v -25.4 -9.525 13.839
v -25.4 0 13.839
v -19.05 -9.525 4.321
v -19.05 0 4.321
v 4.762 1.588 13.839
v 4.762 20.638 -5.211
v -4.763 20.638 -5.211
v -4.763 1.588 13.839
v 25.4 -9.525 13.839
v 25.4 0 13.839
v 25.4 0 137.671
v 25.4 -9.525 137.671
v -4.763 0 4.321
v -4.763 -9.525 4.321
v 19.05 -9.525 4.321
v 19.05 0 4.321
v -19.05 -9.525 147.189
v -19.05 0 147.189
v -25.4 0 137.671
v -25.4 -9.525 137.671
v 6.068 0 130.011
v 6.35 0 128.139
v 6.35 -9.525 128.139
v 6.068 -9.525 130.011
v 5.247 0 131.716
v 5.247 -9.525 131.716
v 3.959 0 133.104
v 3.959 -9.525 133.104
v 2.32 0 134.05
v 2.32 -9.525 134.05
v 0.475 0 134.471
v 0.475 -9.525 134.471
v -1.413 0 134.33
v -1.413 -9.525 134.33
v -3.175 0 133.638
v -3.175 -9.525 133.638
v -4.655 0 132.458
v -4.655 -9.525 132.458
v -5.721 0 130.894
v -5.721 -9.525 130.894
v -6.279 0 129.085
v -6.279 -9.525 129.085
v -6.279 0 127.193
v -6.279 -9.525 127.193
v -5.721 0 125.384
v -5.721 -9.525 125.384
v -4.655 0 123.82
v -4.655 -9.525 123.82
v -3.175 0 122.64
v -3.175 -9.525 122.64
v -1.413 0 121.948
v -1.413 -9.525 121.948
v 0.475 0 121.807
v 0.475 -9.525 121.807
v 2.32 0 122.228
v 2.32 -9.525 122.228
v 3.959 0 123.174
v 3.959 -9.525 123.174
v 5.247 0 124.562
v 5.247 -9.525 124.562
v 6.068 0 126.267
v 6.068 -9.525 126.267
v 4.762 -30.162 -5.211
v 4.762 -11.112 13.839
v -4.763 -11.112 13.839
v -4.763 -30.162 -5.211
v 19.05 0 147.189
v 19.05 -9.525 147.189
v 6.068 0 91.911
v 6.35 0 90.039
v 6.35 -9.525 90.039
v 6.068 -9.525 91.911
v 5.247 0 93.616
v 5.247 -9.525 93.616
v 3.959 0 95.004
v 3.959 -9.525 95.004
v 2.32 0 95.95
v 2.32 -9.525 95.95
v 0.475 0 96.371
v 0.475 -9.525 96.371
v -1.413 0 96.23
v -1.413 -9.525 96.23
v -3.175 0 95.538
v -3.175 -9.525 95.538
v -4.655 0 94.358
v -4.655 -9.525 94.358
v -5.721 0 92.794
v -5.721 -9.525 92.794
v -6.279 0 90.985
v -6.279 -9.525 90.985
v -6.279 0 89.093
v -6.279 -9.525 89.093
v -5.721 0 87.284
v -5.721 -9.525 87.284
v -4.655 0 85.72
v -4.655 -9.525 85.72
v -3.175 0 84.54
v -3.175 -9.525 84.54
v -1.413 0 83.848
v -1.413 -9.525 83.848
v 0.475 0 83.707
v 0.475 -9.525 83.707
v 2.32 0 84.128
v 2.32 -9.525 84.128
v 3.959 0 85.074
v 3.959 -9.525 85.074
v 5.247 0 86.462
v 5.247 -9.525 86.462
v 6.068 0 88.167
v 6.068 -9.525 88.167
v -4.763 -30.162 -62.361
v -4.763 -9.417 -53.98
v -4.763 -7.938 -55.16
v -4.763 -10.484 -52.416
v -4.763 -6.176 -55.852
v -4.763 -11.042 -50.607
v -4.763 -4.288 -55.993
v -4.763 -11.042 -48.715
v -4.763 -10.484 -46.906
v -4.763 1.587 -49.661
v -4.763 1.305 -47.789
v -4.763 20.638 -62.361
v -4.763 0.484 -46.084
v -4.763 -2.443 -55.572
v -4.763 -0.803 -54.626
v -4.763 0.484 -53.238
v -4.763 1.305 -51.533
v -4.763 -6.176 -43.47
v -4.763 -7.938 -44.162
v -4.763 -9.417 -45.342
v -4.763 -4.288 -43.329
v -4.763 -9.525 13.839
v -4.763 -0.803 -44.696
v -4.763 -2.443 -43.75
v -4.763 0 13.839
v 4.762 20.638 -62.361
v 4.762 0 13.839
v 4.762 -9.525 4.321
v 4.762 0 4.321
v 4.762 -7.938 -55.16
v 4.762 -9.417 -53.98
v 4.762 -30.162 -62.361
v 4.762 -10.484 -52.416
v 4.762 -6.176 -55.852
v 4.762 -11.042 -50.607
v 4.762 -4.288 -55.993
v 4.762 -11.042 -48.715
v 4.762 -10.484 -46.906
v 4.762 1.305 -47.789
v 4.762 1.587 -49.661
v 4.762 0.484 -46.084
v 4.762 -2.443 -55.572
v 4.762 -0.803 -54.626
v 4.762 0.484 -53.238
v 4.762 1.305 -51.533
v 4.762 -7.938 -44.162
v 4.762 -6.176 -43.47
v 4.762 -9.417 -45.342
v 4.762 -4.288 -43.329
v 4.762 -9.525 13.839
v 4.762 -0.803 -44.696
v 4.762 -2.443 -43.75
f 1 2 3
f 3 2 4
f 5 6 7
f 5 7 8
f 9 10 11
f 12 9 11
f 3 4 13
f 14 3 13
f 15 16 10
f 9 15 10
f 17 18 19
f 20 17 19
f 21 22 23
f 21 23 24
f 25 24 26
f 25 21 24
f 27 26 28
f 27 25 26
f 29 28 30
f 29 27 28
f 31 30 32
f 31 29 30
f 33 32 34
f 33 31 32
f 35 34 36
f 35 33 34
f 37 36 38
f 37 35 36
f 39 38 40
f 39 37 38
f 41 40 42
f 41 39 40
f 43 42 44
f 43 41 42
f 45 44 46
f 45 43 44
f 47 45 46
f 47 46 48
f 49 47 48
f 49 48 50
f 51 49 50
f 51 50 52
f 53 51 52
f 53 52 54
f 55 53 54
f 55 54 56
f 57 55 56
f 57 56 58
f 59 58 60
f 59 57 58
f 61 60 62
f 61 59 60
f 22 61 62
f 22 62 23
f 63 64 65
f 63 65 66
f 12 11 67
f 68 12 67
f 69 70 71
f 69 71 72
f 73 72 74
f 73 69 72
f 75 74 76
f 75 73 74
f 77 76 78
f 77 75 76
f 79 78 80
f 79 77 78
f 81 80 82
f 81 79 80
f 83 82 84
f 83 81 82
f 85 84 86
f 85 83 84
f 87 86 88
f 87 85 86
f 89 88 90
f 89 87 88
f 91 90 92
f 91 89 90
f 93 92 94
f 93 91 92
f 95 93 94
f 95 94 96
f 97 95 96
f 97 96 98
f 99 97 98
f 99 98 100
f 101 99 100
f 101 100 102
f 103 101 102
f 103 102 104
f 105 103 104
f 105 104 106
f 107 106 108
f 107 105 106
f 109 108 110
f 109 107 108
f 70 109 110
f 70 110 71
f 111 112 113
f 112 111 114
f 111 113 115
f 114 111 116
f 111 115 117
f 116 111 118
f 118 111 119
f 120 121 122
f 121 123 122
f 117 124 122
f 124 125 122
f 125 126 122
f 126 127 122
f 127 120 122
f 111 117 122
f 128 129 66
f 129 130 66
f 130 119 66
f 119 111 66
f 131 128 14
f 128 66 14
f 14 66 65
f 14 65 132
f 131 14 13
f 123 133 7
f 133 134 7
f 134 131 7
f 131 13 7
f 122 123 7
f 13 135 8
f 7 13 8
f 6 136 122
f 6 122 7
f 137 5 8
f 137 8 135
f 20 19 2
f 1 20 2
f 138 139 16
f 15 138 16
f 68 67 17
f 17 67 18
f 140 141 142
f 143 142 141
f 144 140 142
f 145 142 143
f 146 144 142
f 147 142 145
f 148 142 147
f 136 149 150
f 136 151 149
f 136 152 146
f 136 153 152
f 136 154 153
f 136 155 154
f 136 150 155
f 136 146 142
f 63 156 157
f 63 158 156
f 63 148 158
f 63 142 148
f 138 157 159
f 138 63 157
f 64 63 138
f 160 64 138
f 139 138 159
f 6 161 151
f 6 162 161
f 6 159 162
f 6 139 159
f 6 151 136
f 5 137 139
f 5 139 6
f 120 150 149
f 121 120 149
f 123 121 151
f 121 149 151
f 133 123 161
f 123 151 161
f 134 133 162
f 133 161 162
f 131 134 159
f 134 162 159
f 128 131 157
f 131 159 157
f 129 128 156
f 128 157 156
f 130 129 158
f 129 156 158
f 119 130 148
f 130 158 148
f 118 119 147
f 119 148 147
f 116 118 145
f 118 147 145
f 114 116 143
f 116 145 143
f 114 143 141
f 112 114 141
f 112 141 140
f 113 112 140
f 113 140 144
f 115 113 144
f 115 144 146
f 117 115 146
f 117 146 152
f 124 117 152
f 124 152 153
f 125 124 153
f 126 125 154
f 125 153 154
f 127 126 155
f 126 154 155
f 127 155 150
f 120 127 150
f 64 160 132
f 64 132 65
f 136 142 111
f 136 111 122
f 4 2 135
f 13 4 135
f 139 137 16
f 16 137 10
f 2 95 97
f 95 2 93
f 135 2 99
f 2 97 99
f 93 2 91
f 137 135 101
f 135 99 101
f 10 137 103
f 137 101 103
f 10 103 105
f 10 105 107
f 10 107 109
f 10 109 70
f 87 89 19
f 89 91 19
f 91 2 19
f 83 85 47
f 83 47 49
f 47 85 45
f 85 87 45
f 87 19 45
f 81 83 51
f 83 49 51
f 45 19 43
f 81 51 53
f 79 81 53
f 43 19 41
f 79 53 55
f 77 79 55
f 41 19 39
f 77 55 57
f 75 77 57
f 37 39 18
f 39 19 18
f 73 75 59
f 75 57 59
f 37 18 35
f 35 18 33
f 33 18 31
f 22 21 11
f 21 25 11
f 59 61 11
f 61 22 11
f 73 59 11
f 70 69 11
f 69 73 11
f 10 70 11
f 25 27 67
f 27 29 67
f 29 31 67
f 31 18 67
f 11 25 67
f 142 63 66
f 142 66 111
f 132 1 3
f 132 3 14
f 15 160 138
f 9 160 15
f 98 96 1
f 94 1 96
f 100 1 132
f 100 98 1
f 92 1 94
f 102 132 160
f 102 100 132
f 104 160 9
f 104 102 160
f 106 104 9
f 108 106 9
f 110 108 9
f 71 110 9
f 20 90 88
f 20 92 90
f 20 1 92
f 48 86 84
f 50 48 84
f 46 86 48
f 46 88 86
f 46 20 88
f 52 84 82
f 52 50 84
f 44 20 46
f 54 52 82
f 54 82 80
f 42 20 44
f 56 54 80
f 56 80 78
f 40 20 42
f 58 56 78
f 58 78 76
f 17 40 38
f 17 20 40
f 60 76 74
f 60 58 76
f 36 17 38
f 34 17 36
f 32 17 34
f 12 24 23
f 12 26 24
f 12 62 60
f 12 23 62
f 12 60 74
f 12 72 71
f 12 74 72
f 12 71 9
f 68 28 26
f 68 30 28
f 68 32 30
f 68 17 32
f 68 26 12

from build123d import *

# Parameters (mm, degrees)
F0_R     = 6.35
F1_DEPTH = 9.525
F3_START = -20.6375
F2_R     = 6.35
F3_DEPTH = 9.525


with BuildPart() as f1:
    # F0 (on Front) → F1 (new body)
    with BuildSketch(Plane.XZ):
        Polygon((-19.05, 147.1890725479), (-25.4, 137.6710385084), (-25.4, 75.7550555281), (-25.4, 13.8390725479), (-19.05, 4.3210385084), (19.05, 4.3210385084), (25.4, 13.8390725479), (25.4, 75.7550555281), (25.4, 137.6710385084), (19.05, 147.1890725479), align=None)
        with Locations((0, 90.0390725479)):
            Circle(F0_R, mode=Mode.SUBTRACT)
        with Locations((0, 128.1390725479)):
            Circle(F0_R, mode=Mode.SUBTRACT)
    extrude(amount=F1_DEPTH)

    # F2 (on face) → F3 (join)
    with BuildSketch(Plane.YZ.offset(25.4).offset(F3_START)):
        Polygon((-9.525, 13.8390725479), (-11.1125, 13.8390725479), (-30.1625, -5.2109274521), (-30.1625, -62.3609274521), (20.6375, -62.3609274521), (20.6375, -5.2109274521), (1.5875, 13.8390725479), (0, 13.8390725479), align=None)
        with Locations((-4.7625, -49.6609274521)):
            Circle(F2_R, mode=Mode.SUBTRACT)
    extrude(amount=-F3_DEPTH)


solid = f1.part
